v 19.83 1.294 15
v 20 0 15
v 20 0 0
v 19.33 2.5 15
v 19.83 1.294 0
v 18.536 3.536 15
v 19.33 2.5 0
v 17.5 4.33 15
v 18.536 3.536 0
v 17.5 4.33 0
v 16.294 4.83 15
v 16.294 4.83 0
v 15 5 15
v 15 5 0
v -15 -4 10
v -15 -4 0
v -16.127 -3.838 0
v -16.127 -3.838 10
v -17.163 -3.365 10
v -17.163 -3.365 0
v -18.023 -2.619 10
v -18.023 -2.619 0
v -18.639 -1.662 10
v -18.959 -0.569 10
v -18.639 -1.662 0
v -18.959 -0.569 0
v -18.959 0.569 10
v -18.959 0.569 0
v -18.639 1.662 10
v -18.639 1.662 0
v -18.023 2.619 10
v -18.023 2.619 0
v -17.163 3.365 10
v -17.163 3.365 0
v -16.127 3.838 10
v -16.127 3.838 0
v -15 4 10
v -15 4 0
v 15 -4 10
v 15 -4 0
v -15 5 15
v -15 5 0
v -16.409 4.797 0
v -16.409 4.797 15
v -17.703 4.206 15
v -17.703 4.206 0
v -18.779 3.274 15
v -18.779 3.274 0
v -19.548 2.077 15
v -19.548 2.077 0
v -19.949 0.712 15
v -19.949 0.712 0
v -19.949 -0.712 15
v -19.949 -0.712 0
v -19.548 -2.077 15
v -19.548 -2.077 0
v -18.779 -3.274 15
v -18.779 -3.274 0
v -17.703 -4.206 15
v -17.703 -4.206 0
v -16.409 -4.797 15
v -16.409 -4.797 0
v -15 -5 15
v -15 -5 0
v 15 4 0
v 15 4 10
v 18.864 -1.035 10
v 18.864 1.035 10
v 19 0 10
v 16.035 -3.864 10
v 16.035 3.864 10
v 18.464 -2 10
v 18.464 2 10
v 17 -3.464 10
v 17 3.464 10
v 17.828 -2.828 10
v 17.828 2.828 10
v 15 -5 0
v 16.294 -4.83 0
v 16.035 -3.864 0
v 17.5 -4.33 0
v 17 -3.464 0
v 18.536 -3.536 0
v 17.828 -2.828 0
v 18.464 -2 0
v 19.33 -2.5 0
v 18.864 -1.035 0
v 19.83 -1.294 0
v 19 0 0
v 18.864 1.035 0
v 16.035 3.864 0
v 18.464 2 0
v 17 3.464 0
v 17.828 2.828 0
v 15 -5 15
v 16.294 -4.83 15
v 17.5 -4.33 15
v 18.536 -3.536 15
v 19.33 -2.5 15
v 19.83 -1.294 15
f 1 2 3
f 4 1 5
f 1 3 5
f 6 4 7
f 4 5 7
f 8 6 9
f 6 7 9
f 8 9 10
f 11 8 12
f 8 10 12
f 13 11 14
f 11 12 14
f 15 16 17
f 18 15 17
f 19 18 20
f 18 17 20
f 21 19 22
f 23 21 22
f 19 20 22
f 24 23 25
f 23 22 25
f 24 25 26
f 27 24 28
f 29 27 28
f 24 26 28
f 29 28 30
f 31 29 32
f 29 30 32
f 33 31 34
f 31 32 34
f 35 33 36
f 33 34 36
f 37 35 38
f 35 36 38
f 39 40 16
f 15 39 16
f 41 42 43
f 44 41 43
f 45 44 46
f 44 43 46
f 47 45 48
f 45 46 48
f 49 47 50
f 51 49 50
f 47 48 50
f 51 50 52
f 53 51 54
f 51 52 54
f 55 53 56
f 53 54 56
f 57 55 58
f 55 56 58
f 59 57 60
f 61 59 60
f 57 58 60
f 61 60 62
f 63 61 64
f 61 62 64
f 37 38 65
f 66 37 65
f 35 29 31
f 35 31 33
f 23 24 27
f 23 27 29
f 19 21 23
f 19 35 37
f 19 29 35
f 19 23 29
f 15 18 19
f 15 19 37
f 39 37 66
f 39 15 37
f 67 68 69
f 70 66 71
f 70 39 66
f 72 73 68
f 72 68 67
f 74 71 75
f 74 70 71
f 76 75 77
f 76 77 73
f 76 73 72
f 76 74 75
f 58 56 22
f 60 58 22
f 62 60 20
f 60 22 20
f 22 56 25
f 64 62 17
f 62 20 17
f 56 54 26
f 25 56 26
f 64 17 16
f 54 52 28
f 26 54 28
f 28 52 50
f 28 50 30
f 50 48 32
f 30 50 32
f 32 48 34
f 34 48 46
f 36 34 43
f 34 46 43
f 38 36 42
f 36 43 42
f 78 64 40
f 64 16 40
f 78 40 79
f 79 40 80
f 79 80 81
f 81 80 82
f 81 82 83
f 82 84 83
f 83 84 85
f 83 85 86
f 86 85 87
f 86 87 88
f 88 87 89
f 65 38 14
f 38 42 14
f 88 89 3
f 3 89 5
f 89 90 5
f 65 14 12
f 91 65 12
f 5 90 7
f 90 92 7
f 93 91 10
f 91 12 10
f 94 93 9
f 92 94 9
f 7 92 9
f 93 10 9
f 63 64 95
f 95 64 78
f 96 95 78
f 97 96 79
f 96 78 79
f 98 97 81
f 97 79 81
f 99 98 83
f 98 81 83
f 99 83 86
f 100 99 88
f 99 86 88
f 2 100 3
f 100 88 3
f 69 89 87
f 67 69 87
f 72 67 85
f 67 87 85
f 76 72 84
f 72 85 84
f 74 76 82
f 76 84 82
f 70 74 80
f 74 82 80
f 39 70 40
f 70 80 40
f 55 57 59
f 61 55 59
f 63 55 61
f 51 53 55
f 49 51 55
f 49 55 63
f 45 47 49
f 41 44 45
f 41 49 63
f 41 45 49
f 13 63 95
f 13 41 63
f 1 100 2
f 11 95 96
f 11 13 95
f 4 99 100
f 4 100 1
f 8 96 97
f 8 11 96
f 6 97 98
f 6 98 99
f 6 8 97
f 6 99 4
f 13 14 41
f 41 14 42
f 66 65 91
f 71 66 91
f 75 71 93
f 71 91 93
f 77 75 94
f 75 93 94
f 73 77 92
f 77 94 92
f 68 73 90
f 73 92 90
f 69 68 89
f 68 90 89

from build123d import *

# Parameters (mm, degrees)
F1_DEPTH = 15
F3_DEPTH = 10


with BuildPart() as f1:
    # F0 (on Top) → F1 (new body)
    with BuildSketch(Plane.XY):
        with BuildLine():
            ThreePointArc((15, 5), (10, 0), (15, -5))
            Line((15, -5), (15, 5))
        make_face()
        with BuildLine():
            Line((-15, -5), (15, -5))
            ThreePointArc((15, -5), (10, 0), (15, 5))
            Line((15, 5), (-15, 5))
            ThreePointArc((-15, 5), (-11.4644660941, 3.5355339059), (-10, 0))
            ThreePointArc((-10, 0), (-11.4644660941, -3.5355339059), (-15, -5))
        make_face()
        with BuildLine():
            Line((15, 5), (15, -5))
            ThreePointArc((15, -5), (18.5355339059, -3.5355339059), (20, 0))
            ThreePointArc((20, 0), (18.5355339059, 3.5355339059), (15, 5))
        make_face()
        with BuildLine():
            ThreePointArc((-15, 5), (-20, 0), (-15, -5))
            Line((-15, -5), (-15, 5))
        make_face()
        with BuildLine():
            Line((-15, 5), (-15, -5))
            ThreePointArc((-15, -5), (-11.4644660941, -3.5355339059), (-10, 0))
            ThreePointArc((-10, 0), (-11.4644660941, 3.5355339059), (-15, 5))
        make_face()
    extrude(amount=F1_DEPTH)

    # F2 (on face) → F3 (cut)
    with BuildSketch(Plane(origin=(0, 0, 0), x_dir=(1, 0, 0), z_dir=(0, 0, -1))):
        with BuildLine():
            ThreePointArc((15, 4), (11, 0), (15, -4))
            Line((15, -4), (15, 4))
        make_face()
        with BuildLine():
            Line((-15, -4), (15, -4))
            ThreePointArc((15, -4), (11, 0), (15, 4))
            Line((15, 4), (-15, 4))
            ThreePointArc((-15, 4), (-12.1715728753, 2.8284271247), (-11, 0))
            ThreePointArc((-11, 0), (-12.1715728753, -2.8284271247), (-15, -4))
        make_face()
        with BuildLine():
            Line((15, 4), (15, -4))
            ThreePointArc((15, -4), (17.8284271247, -2.8284271247), (19, 0))
            ThreePointArc((19, 0), (17.8284271247, 2.8284271247), (15, 4))
        make_face()
        with BuildLine():
            ThreePointArc((-15, 4), (-19, 0), (-15, -4))
            Line((-15, -4), (-15, 4))
        make_face()
        with BuildLine():
            Line((-15, 4), (-15, -4))
            ThreePointArc((-15, -4), (-12.1715728753, -2.8284271247), (-11, 0))
            ThreePointArc((-11, 0), (-12.1715728753, 2.8284271247), (-15, 4))
        make_face()
    extrude(amount=-F3_DEPTH, mode=Mode.SUBTRACT)


solid = f1.part
